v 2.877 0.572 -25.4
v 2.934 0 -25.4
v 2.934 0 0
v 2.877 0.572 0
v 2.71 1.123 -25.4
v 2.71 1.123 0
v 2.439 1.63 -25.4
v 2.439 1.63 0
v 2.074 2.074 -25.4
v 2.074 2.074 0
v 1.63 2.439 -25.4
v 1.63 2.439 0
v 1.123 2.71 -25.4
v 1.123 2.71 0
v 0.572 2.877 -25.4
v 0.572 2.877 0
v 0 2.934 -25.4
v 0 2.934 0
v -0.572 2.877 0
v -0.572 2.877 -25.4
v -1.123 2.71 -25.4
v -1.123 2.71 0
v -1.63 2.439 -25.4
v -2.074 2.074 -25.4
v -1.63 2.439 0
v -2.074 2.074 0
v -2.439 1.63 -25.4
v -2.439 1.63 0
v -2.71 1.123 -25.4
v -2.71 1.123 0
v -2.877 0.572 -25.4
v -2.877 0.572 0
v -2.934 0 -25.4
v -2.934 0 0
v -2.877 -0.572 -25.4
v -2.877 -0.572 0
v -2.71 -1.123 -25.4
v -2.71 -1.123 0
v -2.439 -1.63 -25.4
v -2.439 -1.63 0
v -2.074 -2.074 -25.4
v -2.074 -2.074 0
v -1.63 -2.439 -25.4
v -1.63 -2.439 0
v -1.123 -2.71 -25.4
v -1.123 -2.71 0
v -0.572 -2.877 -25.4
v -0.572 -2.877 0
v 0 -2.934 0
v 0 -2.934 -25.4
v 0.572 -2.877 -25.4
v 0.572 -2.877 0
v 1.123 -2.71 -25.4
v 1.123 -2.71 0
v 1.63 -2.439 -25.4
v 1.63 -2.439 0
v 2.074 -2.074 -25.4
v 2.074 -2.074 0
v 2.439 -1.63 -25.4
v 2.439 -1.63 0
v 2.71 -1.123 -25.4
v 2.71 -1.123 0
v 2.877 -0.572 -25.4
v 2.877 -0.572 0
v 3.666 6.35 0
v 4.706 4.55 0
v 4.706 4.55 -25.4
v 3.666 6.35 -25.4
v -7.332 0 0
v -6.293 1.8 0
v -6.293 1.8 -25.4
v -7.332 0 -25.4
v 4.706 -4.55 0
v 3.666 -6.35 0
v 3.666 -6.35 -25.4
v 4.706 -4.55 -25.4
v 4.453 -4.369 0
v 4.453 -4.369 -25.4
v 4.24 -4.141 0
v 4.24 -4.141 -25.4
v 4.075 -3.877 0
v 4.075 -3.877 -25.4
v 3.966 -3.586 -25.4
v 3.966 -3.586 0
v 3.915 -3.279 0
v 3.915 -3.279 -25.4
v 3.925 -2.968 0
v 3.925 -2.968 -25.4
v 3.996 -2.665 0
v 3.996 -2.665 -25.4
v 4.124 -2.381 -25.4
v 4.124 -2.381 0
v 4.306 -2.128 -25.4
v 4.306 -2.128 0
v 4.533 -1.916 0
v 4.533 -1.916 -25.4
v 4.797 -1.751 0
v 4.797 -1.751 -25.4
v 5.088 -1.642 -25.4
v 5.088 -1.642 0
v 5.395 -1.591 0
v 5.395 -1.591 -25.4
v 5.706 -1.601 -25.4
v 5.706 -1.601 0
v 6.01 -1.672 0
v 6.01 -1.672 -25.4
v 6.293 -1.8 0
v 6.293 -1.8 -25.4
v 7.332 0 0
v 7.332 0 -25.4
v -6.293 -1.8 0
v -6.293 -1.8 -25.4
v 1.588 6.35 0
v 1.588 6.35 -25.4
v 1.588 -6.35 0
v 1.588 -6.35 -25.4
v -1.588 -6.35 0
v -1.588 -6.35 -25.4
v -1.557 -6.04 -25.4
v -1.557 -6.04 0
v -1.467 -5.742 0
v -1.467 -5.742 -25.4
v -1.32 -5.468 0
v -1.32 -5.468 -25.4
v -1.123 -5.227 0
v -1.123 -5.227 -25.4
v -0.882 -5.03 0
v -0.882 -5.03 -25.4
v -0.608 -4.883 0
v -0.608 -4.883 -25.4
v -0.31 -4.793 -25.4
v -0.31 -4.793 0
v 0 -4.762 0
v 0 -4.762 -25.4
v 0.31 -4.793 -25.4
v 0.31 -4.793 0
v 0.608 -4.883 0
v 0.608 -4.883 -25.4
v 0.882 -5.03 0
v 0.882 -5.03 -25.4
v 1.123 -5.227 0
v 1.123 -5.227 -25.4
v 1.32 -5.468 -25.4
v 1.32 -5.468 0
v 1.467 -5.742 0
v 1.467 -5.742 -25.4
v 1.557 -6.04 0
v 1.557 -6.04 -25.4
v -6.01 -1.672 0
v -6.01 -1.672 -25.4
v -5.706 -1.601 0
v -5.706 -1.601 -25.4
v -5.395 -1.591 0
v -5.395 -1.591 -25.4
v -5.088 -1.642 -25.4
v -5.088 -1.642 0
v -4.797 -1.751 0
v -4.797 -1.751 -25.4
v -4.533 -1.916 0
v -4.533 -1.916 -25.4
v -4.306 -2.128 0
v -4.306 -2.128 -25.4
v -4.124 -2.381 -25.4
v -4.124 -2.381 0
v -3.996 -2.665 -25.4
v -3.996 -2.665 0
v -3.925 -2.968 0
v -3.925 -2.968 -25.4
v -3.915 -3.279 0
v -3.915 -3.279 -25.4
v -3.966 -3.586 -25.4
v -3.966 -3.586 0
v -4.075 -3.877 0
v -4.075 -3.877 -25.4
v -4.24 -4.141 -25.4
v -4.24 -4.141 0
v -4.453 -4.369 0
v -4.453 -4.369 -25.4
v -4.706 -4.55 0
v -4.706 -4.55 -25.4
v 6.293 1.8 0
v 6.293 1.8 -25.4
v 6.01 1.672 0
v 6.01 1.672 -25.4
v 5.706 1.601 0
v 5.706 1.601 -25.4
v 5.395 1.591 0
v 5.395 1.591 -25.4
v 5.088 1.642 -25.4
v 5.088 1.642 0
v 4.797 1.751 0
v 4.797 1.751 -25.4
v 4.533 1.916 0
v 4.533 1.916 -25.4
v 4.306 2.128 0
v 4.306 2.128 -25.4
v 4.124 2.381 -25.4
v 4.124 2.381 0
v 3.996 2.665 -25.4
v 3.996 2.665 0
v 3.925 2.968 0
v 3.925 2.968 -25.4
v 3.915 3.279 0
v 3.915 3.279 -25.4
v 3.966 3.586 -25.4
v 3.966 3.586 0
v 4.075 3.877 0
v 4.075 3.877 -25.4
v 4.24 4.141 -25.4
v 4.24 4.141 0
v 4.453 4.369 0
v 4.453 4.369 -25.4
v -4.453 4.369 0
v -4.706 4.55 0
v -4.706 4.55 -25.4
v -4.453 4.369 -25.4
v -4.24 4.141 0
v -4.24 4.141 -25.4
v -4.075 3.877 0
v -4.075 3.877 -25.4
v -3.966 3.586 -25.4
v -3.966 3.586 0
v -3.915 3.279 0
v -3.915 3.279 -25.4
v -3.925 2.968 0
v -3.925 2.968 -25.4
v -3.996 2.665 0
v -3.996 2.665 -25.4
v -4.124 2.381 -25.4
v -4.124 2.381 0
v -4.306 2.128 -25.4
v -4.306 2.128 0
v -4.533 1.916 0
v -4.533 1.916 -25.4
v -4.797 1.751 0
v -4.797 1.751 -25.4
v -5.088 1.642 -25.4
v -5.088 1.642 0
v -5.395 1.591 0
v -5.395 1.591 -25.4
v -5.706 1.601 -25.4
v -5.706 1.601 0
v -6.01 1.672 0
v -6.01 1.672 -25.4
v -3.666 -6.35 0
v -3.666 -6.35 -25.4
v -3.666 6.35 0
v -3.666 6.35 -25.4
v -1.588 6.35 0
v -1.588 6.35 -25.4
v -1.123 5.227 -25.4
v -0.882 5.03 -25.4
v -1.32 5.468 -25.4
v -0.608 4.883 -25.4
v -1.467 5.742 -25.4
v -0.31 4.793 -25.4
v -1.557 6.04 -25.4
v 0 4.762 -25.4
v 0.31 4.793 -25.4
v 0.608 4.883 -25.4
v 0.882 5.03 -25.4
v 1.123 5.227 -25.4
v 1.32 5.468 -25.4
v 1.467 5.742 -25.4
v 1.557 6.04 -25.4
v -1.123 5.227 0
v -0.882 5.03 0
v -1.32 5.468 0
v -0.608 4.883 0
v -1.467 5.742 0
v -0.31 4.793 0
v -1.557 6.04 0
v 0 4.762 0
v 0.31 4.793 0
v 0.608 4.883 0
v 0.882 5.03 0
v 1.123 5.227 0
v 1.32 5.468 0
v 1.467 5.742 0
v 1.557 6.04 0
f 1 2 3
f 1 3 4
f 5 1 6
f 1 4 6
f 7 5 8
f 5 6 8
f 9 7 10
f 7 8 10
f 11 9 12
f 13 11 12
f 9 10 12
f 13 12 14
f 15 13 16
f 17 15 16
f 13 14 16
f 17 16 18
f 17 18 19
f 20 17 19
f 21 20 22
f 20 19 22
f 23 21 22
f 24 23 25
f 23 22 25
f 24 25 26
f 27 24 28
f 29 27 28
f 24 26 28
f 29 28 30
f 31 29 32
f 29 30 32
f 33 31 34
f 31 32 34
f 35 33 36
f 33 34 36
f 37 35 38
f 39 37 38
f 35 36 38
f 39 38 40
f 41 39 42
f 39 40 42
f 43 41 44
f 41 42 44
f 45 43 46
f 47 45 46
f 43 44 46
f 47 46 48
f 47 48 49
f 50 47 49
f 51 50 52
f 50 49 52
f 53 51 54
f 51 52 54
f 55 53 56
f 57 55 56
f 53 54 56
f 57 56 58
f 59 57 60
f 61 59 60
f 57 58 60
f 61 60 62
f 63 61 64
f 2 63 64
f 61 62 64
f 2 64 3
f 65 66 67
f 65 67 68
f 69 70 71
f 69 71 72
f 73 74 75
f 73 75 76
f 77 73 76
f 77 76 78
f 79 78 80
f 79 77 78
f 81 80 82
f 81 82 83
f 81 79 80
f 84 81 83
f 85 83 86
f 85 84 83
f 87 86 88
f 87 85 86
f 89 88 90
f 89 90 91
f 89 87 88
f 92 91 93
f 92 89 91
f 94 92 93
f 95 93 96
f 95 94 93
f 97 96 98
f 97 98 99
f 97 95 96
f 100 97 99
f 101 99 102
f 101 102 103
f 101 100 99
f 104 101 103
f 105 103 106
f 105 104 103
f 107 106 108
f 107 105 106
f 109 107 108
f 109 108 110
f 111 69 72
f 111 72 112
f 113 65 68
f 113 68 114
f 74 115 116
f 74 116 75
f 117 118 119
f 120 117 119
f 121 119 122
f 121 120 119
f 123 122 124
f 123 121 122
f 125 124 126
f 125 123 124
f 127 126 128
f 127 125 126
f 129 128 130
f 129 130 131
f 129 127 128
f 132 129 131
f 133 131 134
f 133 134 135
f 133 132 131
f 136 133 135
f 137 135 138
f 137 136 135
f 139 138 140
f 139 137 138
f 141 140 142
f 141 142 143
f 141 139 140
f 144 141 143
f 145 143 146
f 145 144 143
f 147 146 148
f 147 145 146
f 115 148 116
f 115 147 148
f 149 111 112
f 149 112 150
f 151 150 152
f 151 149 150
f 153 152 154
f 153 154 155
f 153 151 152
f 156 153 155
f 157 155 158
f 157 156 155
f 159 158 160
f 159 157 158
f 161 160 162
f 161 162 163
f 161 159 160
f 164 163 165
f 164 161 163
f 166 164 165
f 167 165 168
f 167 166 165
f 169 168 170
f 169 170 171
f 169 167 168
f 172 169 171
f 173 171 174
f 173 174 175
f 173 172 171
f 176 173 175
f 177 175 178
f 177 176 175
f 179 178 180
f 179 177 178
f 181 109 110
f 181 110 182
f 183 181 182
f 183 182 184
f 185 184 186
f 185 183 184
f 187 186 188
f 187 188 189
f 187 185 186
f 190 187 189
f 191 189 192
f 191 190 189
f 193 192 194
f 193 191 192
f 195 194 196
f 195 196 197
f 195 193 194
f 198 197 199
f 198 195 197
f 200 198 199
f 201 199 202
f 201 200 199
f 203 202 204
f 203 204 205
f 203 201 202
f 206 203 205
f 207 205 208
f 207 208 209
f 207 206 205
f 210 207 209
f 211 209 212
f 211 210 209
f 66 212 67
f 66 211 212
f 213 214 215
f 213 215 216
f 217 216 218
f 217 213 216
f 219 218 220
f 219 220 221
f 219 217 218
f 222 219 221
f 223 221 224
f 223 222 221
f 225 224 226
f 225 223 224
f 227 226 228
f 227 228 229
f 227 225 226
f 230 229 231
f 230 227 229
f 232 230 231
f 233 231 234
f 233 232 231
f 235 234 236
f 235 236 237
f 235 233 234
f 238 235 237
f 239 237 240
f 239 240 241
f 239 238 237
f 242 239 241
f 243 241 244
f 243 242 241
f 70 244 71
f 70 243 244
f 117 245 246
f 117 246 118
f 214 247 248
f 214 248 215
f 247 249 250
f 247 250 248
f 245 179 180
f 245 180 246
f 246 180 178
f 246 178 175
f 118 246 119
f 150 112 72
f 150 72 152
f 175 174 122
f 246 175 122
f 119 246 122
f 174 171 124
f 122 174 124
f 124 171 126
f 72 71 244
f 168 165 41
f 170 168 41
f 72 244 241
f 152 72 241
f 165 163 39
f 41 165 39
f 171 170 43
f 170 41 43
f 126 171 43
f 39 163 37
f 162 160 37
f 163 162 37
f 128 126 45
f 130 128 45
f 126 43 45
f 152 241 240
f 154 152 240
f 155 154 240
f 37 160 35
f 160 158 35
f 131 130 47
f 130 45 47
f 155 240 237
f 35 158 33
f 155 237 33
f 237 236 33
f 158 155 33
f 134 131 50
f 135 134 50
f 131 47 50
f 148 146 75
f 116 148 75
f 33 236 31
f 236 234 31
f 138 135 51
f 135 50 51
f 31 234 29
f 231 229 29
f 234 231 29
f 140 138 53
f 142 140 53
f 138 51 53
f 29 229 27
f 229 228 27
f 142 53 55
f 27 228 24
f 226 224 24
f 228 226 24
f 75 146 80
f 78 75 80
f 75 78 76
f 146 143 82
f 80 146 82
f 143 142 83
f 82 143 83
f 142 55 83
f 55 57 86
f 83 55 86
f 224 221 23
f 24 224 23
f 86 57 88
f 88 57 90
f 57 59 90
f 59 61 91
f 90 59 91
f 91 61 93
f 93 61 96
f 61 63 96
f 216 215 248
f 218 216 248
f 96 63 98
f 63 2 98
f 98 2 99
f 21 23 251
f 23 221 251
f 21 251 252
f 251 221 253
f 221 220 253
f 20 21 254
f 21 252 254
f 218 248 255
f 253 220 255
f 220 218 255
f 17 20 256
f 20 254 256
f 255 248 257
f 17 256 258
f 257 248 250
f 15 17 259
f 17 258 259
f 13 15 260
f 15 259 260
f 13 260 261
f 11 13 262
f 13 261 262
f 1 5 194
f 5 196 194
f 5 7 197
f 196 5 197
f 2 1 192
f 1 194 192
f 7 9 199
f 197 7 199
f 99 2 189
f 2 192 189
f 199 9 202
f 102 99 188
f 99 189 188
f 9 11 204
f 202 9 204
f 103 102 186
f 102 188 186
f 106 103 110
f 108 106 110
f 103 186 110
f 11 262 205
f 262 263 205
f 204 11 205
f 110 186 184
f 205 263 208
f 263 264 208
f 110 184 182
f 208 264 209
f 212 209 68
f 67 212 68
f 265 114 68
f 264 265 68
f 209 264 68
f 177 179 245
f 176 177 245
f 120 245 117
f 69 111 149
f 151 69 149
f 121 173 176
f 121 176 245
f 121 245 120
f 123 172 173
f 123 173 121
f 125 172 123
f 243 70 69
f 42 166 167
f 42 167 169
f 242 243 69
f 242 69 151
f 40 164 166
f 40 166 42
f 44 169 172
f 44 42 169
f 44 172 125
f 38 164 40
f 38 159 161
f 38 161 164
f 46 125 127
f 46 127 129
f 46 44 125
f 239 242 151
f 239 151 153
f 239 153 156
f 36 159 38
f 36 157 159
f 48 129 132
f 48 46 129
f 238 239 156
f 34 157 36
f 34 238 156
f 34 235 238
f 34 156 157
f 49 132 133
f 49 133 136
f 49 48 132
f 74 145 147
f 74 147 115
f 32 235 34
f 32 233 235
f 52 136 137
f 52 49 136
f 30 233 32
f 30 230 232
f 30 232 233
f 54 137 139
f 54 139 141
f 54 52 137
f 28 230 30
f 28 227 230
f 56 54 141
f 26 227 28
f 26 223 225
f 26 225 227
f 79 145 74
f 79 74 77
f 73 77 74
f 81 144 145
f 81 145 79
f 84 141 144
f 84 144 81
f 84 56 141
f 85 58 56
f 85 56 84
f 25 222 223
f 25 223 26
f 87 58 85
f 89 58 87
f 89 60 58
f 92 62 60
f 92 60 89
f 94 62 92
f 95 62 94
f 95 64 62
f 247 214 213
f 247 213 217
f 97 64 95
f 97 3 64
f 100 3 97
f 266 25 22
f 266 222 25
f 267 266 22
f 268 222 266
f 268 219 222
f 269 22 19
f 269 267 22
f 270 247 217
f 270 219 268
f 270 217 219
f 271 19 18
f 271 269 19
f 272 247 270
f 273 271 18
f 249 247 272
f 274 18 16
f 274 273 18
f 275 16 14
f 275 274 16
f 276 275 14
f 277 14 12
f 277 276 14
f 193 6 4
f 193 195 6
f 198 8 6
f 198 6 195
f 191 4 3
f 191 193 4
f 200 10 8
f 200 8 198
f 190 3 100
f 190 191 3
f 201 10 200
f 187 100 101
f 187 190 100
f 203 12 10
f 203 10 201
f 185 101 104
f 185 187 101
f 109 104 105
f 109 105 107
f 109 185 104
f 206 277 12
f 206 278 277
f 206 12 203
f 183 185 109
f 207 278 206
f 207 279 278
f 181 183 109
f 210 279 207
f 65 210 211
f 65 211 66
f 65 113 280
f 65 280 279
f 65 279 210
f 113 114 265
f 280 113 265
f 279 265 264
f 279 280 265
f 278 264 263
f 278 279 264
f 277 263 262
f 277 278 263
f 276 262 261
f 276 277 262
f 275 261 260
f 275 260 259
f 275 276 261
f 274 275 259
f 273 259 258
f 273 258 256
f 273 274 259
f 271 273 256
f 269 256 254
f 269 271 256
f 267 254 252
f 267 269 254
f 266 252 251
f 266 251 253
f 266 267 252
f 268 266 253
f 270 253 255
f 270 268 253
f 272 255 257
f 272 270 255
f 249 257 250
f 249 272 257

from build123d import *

# Parameters (mm, degrees)
SKETCH1_R           = 2.9337
BOSS_EXTRUDE1_DEPTH = 25.4


with BuildPart() as part:
    # Sketch1 → Boss-Extrude1 (new body)
    with BuildSketch(Plane.XY):
        with BuildLine():
            Line((-4.705511314, -4.549815329), (-3.666174209, -6.35))
            Line((-3.666174209, -6.35), (-1.5875, -6.35))
            ThreePointArc((-1.5875, -6.35), (0, -4.7625), (1.5875, -6.35))
            Line((1.5875, -6.35), (3.666174209, -6.35))
            Line((3.666174209, -6.35), (4.705511314, -4.549815329))
            ThreePointArc((4.705511314, -4.549815329), (4.124445986, -2.38125), (6.293011314, -1.800184671))
            Line((6.293011314, -1.800184671), (7.332348419, 0))
            Line((7.332348419, 0), (6.293011314, 1.800184671))
            ThreePointArc((6.293011314, 1.800184671), (4.124445986, 2.38125), (4.705511314, 4.549815329))
            Line((4.705511314, 4.549815329), (3.666174209, 6.35))
            Line((3.666174209, 6.35), (1.5875, 6.35))
            ThreePointArc((1.5875, 6.35), (0, 4.7625), (-1.5875, 6.35))
            Line((-1.5875, 6.35), (-3.666174209, 6.35))
            Line((-3.666174209, 6.35), (-4.705511314, 4.549815329))
            ThreePointArc((-4.705511314, 4.549815329), (-4.124445986, 2.38125), (-6.293011314, 1.800184671))
            Line((-6.293011314, 1.800184671), (-7.332348419, 0))
            Line((-7.332348419, 0), (-6.293011314, -1.800184671))
            ThreePointArc((-6.293011314, -1.800184671), (-4.124445986, -2.38125), (-4.705511314, -4.549815329))
        make_face()
        Circle(SKETCH1_R, mode=Mode.SUBTRACT)
    extrude(amount=-BOSS_EXTRUDE1_DEPTH)


solid = part.part
